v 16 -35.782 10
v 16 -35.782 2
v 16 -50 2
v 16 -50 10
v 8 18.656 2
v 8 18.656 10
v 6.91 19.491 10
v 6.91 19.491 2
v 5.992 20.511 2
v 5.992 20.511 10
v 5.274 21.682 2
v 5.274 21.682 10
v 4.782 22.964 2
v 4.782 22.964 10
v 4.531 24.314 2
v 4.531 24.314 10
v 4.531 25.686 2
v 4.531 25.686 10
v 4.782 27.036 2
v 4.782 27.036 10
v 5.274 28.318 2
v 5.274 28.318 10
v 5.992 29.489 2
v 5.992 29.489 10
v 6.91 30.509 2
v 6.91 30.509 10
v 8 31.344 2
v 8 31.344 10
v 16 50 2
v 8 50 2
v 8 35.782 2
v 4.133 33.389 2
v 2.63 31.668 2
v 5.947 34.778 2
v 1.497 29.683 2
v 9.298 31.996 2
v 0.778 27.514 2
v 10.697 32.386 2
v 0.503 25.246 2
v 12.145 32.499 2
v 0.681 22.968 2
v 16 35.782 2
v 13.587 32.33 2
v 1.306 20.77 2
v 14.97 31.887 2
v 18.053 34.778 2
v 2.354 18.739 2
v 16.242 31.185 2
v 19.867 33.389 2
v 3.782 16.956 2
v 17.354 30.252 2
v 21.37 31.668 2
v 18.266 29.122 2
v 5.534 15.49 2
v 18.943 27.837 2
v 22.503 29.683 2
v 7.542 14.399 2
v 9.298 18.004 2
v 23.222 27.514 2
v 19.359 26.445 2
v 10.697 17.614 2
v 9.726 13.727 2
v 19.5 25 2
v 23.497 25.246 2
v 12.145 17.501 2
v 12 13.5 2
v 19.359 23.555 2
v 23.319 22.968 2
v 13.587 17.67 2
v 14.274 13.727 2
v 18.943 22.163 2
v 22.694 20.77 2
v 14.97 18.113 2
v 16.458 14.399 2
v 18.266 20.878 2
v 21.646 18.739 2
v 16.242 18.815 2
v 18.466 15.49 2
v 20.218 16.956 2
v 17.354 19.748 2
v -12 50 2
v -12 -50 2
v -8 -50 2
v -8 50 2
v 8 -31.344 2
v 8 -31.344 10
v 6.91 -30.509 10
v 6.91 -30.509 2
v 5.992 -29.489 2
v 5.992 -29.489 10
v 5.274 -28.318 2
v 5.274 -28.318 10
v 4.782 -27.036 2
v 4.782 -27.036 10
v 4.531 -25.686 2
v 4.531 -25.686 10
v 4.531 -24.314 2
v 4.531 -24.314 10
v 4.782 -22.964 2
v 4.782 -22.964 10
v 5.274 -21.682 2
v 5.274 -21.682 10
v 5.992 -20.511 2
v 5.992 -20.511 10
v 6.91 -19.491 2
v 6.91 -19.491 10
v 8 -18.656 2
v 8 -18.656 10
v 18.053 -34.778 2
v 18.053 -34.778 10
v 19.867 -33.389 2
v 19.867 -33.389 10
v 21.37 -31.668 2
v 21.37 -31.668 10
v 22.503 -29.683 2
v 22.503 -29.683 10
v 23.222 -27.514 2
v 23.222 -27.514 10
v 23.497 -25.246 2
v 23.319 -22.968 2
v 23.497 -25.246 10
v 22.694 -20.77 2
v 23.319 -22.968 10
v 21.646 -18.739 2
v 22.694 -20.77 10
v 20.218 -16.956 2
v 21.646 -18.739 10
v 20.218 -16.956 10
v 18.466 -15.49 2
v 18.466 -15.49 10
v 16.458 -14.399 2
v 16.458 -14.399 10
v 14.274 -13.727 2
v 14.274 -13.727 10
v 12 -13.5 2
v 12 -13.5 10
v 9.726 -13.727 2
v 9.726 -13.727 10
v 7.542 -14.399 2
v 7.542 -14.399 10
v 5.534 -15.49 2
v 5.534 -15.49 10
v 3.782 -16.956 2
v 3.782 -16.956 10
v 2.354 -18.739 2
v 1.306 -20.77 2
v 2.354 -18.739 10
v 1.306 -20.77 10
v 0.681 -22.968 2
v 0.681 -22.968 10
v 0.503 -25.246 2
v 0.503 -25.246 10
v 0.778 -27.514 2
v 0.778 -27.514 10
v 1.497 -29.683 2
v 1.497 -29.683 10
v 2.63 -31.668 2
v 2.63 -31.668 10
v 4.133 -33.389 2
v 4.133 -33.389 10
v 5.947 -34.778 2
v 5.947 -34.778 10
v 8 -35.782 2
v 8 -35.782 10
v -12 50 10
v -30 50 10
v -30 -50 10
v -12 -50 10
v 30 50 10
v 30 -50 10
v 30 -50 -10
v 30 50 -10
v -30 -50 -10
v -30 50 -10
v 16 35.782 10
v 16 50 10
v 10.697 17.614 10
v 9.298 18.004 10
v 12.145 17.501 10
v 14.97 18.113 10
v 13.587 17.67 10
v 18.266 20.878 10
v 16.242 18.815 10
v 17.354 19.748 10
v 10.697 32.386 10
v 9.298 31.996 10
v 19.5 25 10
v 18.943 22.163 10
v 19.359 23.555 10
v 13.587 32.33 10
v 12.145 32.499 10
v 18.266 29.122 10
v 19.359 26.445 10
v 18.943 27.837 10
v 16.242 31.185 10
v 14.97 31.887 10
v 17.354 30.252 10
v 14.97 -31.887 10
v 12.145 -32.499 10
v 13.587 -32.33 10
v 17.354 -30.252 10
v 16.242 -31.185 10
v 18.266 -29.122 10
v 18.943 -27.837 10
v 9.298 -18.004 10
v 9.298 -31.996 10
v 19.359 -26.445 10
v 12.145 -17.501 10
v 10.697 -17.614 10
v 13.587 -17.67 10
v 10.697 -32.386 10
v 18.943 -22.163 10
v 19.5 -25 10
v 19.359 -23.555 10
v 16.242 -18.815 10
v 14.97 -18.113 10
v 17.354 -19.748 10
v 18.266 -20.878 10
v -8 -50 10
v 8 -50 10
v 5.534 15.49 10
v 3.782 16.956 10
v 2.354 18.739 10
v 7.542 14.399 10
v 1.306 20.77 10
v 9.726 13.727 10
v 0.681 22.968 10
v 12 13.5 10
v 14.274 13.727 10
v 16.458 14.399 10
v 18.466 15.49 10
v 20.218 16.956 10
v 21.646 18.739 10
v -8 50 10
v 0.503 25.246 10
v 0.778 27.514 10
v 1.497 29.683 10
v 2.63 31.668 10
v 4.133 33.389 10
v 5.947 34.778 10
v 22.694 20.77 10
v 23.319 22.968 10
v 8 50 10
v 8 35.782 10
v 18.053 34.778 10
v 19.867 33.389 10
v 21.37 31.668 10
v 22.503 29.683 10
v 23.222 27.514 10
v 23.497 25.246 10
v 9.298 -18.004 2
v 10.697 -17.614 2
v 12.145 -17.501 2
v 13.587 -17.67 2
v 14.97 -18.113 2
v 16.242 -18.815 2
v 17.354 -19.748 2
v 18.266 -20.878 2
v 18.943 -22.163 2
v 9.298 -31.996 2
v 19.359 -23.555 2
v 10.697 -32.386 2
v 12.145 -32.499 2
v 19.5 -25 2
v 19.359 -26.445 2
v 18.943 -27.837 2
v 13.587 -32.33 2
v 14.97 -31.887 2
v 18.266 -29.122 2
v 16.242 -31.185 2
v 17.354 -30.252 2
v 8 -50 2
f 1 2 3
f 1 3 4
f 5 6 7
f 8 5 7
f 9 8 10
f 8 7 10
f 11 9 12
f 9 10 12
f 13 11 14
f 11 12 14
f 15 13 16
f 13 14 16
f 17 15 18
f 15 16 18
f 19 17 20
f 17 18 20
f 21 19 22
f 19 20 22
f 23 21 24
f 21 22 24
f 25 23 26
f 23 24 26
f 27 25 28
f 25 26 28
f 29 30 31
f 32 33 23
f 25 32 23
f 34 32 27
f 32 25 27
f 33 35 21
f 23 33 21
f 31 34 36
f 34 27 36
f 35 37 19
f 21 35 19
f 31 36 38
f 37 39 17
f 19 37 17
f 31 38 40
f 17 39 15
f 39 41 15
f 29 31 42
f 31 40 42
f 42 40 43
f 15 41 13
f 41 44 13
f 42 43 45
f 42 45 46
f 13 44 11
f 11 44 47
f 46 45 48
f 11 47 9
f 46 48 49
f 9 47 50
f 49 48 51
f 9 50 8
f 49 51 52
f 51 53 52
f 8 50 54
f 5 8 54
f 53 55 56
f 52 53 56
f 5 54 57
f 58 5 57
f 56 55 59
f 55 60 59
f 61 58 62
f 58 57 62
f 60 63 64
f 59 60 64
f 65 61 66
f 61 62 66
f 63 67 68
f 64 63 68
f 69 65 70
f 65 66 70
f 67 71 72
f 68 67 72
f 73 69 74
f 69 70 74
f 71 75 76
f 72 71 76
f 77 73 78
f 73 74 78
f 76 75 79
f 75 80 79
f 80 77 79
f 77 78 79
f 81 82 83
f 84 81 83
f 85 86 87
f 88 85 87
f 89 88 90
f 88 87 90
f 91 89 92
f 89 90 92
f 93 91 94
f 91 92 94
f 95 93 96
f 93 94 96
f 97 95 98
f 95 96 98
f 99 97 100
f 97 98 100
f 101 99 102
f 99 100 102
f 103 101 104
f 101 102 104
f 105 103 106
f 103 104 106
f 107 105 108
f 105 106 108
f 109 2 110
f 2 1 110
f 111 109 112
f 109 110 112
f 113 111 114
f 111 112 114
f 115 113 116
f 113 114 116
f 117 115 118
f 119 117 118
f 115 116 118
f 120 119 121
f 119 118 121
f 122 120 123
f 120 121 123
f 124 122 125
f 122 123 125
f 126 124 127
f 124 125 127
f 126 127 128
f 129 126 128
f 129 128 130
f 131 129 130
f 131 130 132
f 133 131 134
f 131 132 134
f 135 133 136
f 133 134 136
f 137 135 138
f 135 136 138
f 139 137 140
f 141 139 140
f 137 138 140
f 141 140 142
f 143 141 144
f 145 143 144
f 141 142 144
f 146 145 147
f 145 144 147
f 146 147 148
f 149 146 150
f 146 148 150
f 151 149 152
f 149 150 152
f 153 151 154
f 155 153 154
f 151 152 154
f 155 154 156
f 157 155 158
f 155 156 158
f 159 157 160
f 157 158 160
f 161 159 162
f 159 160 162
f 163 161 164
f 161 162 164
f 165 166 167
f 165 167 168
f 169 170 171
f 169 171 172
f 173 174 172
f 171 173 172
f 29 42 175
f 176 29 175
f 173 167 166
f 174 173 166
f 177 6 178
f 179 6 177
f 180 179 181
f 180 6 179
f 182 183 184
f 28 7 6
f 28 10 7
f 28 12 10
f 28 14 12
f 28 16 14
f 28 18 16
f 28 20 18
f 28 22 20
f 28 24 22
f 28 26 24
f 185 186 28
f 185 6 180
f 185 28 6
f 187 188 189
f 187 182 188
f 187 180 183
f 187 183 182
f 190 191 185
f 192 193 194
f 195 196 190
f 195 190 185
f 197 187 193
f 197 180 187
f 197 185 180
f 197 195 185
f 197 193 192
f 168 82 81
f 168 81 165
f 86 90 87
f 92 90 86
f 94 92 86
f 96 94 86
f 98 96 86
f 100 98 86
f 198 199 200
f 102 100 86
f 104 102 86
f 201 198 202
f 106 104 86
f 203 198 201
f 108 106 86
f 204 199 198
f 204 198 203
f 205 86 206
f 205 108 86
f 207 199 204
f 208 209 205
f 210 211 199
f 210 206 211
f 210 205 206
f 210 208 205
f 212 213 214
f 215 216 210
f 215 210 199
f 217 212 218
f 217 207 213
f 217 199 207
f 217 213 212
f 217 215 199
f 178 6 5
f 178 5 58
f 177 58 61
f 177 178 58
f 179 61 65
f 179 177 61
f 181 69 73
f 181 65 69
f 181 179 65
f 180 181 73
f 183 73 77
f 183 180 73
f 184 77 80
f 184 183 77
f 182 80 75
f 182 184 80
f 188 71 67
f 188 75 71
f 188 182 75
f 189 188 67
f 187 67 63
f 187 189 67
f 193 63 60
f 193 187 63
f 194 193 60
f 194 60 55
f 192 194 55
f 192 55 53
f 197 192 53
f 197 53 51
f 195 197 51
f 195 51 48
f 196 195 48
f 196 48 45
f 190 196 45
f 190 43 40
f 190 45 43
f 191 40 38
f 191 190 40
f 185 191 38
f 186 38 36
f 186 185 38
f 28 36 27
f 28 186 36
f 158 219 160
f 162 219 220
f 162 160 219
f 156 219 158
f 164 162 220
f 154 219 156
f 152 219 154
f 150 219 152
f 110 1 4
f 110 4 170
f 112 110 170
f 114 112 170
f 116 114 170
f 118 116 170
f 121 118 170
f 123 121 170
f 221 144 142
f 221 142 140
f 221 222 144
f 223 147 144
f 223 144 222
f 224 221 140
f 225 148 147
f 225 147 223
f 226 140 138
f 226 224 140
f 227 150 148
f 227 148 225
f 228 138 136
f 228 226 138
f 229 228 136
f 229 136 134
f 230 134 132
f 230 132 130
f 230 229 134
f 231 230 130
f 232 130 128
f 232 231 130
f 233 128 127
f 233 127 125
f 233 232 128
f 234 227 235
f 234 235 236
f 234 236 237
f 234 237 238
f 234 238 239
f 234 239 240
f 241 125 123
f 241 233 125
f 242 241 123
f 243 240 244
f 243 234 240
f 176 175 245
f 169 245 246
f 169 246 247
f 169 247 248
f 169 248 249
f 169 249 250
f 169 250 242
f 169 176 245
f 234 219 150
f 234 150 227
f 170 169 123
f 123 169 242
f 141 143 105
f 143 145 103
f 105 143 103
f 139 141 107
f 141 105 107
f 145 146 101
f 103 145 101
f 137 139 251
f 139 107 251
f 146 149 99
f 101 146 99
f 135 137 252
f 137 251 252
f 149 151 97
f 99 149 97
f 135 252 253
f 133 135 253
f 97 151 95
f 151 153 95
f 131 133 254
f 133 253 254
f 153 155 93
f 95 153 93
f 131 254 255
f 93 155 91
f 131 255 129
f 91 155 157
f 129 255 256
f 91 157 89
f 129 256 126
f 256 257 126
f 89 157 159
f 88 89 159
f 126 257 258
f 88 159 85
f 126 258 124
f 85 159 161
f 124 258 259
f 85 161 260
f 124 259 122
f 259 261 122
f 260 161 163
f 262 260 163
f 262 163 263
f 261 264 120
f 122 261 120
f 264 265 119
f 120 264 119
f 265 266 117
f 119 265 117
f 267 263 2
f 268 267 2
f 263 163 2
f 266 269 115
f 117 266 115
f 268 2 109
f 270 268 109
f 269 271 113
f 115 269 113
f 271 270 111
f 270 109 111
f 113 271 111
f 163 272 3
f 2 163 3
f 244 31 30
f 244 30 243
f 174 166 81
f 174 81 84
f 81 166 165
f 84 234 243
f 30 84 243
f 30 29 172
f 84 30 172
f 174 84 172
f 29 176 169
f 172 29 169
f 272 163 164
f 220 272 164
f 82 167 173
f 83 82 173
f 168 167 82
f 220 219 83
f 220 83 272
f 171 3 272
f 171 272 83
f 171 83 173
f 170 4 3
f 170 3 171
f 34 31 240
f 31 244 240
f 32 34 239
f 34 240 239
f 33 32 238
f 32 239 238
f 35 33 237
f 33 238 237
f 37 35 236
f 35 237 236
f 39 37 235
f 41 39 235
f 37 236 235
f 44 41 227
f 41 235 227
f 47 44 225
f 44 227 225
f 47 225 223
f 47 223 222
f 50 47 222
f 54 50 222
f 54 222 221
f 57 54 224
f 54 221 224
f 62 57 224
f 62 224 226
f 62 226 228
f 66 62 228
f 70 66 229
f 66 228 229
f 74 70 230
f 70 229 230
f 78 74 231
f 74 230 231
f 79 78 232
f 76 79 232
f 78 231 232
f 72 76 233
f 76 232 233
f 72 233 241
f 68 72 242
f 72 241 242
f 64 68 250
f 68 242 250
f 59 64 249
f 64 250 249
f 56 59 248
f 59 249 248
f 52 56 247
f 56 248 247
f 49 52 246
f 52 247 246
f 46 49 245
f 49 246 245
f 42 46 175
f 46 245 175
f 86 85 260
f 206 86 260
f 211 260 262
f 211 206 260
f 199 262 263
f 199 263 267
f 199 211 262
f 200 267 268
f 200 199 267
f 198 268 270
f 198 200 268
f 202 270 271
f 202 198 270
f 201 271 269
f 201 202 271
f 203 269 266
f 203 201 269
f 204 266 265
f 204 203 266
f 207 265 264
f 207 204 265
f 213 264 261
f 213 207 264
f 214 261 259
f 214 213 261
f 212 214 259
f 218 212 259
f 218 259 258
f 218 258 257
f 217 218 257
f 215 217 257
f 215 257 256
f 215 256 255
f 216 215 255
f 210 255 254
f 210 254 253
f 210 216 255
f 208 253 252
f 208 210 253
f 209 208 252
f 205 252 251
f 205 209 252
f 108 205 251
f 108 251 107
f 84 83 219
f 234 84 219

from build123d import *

# Parameters (mm, degrees)
F0_W      = 60
F0_H      = 100
F1_DEPTH  = 10
F2_W      = 4
F2_H      = 8
F2_W_2    = 8
F3_DEPTH  = 100.001
F5_W      = 8
F5_H      = 8
F6_DEPTH  = 25
F8_DEPTH  = 8
F10_DEPTH = 8


# Not quite as in the source:
# - a feature names something its author has since deleted; it is built from what else it names


with BuildPart() as f1:
    # F0 (on Top) → F1 (new body, symmetric)
    with BuildSketch(Plane.XY):
        Rectangle(F0_W, F0_H)
    extrude(amount=F1_DEPTH, both=True)

    # F2 (on face) → F3 (cut, through all)
    with BuildSketch(Plane.XZ.offset(50)):
        with Locations((-10, 6)):
            Rectangle(F2_W, F2_H)
        with Locations((12, 6)):
            Rectangle(F2_W_2, F2_H)
    extrude(amount=-F3_DEPTH, mode=Mode.SUBTRACT)

    # F5 (on Front) → F6 (join, symmetric)
    with BuildSketch(Plane.XZ):
        with Locations((12, 6)):
            Rectangle(F5_W, F5_H)
    extrude(amount=F6_DEPTH, both=True)

    # F7 (on face) → F8 (cut, through all)
    with BuildSketch(Plane.XY.offset(10)):
        with BuildLine():
            ThreePointArc((8, 35.7819293264), (0.5, 25), (8, 14.2180706736))
            Line((8, 14.2180706736), (8, 18.6557112298))
            ThreePointArc((8, 18.6557112298), (4.5, 25), (8, 31.3442887702))
            Line((8, 31.3442887702), (8, 35.7819293264))
        make_face()
        with BuildLine():
            ThreePointArc((8, -31.3442887702), (4.5, -25), (8, -18.6557112298))
            Line((8, -18.6557112298), (8, -14.2180706736))
            ThreePointArc((8, -14.2180706736), (0.5, -25), (8, -35.7819293264))
            Line((8, -35.7819293264), (8, -31.3442887702))
        make_face()
        with BuildLine():
            Line((8, 18.6557112298), (8, 14.2180706736))
            ThreePointArc((8, 14.2180706736), (18.5669627683, 15.5593962058), (23.5, 25))
            ThreePointArc((23.5, 25), (18.5669627683, 34.4406037942), (8, 35.7819293264))
            Line((8, 35.7819293264), (8, 31.3442887702))
            ThreePointArc((8, 31.3442887702), (15.6228441865, 31.5669627683), (19.5, 25))
            ThreePointArc((19.5, 25), (15.6228441865, 18.4330372317), (8, 18.6557112298))
        make_face()
        with BuildLine():
            ThreePointArc((8, -18.6557112298), (15.6228441865, -18.4330372317), (19.5, -25))
            ThreePointArc((19.5, -25), (15.6228441865, -31.5669627683), (8, -31.3442887702))
            Line((8, -31.3442887702), (8, -35.7819293264))
            ThreePointArc((8, -35.7819293264), (18.5669627683, -34.4406037942), (23.5, -25))
            ThreePointArc((23.5, -25), (18.5669627683, -15.5593962058), (8, -14.2180706736))
            Line((8, -14.2180706736), (8, -18.6557112298))
        make_face()
    extrude(amount=-F8_DEPTH, mode=Mode.SUBTRACT)

    # F9 (on face) → F10 (join, through all)
    with BuildSketch(Plane.XY.offset(10)):
        with BuildLine():
            ThreePointArc((8, -31.3442887702), (15.6228441865, -31.5669627683), (19.5, -25))
            ThreePointArc((19.5, -25), (15.6228441865, -18.4330372317), (8, -18.6557112298))
            Line((8, -18.6557112298), (8, -31.3442887702))
        make_face()
        with BuildLine():
            Line((8, 31.3442887702), (8, 18.6557112298))
            ThreePointArc((8, 18.6557112298), (15.6228441865, 18.4330372317), (19.5, 25))
            ThreePointArc((19.5, 25), (15.6228441865, 31.5669627683), (8, 31.3442887702))
        make_face()
        with BuildLine():
            ThreePointArc((8, 31.3442887702), (4.5, 25), (8, 18.6557112298))
            Line((8, 18.6557112298), (8, 31.3442887702))
        make_face()
    extrude(amount=-F10_DEPTH)


solid = f1.part
